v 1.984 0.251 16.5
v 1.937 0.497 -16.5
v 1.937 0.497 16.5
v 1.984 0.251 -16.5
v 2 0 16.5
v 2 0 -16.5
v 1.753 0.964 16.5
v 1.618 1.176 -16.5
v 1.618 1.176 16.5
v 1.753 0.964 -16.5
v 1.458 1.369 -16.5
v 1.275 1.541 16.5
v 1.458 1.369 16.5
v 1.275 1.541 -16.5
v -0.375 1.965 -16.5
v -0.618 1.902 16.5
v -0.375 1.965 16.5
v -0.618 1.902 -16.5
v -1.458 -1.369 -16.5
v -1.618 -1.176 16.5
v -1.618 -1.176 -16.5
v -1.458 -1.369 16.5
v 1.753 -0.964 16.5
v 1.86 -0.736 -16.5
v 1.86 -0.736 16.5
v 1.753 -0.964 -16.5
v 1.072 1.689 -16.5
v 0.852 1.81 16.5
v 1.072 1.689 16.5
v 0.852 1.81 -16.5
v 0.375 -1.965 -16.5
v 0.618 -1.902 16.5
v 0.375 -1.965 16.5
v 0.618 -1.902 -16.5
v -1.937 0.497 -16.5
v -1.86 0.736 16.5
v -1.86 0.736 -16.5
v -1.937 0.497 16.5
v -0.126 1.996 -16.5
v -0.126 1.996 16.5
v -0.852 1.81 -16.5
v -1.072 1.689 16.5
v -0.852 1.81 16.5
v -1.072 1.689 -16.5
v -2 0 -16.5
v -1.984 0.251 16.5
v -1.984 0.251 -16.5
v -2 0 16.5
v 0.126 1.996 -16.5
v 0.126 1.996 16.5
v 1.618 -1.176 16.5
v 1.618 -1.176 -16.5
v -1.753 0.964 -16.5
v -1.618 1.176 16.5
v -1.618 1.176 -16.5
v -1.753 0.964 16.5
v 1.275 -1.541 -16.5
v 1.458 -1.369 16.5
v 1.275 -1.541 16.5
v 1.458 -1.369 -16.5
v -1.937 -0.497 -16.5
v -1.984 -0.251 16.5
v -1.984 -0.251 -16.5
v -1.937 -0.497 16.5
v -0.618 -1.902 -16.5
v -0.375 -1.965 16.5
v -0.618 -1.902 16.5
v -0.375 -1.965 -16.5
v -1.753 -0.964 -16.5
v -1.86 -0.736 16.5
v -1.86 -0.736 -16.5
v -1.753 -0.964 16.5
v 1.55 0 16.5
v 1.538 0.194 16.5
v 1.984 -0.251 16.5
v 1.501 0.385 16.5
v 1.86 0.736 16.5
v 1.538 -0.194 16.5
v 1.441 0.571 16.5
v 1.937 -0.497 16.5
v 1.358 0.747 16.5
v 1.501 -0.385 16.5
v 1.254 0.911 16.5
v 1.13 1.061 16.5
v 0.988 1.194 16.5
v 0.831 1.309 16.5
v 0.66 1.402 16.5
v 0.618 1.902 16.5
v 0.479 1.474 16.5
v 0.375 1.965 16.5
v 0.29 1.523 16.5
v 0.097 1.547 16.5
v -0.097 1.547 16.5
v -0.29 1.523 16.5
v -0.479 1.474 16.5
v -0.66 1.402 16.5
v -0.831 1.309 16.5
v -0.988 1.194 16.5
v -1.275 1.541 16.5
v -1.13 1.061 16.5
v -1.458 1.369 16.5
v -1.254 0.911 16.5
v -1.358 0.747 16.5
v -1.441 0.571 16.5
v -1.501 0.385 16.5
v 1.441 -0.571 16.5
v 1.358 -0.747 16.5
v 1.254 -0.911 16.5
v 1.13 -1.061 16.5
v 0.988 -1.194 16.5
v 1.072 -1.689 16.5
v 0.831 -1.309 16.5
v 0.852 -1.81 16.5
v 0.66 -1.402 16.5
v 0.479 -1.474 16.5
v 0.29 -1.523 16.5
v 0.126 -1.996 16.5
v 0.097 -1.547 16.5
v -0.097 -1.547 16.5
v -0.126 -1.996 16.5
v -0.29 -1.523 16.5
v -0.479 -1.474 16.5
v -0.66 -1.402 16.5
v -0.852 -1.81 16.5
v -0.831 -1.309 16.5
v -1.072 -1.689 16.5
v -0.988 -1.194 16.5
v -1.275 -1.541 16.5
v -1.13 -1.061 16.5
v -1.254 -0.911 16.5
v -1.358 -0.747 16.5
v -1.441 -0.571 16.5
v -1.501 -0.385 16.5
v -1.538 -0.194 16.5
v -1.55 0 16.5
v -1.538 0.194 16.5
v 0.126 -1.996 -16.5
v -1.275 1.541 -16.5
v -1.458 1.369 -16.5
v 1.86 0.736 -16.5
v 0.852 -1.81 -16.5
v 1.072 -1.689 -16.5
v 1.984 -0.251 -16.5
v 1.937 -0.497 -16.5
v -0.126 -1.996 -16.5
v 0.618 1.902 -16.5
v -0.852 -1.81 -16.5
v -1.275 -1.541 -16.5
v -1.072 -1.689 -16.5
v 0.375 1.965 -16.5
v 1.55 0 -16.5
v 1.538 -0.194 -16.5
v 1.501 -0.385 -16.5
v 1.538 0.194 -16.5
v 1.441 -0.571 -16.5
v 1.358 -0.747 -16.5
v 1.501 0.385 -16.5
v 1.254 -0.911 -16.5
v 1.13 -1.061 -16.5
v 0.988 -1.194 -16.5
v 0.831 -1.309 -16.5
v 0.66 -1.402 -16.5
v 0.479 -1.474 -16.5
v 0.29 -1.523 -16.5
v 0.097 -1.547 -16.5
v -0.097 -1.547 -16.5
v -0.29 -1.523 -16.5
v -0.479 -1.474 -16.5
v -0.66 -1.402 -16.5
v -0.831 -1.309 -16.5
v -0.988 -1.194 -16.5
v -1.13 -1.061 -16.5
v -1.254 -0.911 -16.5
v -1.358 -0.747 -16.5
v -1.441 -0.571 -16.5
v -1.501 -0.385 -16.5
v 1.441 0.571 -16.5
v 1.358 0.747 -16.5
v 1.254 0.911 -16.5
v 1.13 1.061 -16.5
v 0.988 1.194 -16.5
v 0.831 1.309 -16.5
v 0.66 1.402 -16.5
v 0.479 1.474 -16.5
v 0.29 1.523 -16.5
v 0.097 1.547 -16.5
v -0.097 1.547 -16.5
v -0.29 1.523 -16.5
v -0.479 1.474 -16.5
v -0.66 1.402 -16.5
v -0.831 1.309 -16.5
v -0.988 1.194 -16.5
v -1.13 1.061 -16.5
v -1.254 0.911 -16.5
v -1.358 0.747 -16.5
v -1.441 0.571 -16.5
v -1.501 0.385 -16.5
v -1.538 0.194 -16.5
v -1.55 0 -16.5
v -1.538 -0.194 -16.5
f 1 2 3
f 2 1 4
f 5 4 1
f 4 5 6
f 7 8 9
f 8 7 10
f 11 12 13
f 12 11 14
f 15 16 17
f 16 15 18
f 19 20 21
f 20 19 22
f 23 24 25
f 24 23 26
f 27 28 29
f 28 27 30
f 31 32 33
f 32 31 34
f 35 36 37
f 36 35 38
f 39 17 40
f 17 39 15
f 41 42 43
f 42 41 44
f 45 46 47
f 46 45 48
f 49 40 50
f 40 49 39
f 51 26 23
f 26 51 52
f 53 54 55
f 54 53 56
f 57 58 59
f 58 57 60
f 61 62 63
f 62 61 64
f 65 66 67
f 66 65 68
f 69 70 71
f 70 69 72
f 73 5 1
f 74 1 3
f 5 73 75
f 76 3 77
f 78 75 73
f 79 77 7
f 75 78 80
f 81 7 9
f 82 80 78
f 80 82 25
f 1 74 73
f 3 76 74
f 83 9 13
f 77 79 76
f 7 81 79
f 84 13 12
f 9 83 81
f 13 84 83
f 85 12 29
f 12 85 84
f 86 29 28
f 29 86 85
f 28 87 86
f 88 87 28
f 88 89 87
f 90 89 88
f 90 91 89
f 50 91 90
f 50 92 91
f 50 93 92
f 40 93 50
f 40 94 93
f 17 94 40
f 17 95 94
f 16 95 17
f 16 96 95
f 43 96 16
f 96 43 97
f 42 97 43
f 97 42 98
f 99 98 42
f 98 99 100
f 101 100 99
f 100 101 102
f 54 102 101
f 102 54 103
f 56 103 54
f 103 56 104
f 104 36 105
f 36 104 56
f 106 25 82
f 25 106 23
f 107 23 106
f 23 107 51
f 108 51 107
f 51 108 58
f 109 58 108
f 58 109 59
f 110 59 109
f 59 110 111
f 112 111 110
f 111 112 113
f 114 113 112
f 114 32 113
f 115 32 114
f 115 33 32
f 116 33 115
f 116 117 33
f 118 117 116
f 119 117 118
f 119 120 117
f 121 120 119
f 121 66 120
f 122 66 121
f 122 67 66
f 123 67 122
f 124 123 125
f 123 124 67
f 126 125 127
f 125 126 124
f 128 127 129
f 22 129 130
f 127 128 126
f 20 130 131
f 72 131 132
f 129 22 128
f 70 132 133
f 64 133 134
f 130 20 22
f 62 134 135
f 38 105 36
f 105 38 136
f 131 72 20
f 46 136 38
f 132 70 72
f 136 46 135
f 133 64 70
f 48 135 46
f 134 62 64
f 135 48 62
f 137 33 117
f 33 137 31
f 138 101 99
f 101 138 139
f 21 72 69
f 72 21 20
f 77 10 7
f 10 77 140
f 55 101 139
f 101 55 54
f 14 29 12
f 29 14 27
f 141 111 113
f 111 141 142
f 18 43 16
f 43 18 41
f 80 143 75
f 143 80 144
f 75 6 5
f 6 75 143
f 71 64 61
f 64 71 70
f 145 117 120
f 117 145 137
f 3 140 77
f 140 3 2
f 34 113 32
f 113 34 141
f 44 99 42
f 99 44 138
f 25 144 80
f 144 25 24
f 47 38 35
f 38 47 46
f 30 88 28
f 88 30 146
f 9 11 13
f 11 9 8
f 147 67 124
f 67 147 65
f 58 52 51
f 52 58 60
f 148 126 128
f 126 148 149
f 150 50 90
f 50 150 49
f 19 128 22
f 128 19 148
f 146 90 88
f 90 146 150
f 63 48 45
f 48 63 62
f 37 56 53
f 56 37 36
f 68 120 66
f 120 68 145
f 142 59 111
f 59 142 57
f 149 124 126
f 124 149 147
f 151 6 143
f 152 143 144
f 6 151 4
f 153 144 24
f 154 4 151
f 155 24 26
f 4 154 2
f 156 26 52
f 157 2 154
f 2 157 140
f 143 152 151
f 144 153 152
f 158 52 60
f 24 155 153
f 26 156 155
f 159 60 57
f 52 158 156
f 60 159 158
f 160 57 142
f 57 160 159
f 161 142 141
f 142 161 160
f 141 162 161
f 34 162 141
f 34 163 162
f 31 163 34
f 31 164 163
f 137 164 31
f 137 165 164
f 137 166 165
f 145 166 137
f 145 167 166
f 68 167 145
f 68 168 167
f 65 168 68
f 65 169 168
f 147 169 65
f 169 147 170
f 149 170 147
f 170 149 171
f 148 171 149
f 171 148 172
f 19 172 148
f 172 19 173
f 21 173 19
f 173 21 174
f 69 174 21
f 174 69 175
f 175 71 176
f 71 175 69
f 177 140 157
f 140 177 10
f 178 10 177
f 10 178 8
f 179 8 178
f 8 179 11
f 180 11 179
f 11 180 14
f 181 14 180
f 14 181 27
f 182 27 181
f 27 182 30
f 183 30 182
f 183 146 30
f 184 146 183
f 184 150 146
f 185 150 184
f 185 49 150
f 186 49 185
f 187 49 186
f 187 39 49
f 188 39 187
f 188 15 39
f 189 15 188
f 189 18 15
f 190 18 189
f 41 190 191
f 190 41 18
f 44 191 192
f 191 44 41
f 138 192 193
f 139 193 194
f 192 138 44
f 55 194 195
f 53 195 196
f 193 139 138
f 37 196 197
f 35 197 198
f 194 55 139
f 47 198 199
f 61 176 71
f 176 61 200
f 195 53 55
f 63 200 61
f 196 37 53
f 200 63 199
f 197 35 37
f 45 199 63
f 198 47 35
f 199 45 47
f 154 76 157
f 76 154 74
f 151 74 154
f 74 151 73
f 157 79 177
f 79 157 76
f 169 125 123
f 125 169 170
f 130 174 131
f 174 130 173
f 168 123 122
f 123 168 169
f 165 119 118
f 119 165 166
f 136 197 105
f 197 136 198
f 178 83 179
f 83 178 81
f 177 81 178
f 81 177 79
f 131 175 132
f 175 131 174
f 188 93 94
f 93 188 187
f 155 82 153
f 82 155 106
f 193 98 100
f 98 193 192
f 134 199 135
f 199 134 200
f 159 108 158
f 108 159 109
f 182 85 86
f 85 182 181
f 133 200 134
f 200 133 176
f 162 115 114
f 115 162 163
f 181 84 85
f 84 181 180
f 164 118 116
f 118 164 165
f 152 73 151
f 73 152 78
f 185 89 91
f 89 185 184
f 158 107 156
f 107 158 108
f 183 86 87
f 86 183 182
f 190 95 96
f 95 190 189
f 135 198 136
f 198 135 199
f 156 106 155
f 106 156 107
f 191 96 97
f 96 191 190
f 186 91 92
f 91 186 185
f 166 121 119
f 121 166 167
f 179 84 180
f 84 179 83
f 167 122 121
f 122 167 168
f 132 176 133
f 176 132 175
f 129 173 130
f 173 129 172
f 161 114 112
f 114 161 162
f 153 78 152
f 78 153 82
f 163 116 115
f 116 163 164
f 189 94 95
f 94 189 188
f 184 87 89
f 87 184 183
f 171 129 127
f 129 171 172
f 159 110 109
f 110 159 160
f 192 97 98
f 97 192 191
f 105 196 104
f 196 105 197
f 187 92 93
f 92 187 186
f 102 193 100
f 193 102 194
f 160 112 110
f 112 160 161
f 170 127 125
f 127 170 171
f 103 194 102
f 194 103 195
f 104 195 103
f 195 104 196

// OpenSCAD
$fn = 50;


difference() {
	union() {
		translate(v = [0, 0, -16.5000000000]) {
			cylinder(h = 33, r = 2.0000000000);
		}
	}
	union() {
		translate(v = [0, 0, -100.0000000000]) {
			cylinder(h = 200, r = 1.5500000000);
		}
	}
}
